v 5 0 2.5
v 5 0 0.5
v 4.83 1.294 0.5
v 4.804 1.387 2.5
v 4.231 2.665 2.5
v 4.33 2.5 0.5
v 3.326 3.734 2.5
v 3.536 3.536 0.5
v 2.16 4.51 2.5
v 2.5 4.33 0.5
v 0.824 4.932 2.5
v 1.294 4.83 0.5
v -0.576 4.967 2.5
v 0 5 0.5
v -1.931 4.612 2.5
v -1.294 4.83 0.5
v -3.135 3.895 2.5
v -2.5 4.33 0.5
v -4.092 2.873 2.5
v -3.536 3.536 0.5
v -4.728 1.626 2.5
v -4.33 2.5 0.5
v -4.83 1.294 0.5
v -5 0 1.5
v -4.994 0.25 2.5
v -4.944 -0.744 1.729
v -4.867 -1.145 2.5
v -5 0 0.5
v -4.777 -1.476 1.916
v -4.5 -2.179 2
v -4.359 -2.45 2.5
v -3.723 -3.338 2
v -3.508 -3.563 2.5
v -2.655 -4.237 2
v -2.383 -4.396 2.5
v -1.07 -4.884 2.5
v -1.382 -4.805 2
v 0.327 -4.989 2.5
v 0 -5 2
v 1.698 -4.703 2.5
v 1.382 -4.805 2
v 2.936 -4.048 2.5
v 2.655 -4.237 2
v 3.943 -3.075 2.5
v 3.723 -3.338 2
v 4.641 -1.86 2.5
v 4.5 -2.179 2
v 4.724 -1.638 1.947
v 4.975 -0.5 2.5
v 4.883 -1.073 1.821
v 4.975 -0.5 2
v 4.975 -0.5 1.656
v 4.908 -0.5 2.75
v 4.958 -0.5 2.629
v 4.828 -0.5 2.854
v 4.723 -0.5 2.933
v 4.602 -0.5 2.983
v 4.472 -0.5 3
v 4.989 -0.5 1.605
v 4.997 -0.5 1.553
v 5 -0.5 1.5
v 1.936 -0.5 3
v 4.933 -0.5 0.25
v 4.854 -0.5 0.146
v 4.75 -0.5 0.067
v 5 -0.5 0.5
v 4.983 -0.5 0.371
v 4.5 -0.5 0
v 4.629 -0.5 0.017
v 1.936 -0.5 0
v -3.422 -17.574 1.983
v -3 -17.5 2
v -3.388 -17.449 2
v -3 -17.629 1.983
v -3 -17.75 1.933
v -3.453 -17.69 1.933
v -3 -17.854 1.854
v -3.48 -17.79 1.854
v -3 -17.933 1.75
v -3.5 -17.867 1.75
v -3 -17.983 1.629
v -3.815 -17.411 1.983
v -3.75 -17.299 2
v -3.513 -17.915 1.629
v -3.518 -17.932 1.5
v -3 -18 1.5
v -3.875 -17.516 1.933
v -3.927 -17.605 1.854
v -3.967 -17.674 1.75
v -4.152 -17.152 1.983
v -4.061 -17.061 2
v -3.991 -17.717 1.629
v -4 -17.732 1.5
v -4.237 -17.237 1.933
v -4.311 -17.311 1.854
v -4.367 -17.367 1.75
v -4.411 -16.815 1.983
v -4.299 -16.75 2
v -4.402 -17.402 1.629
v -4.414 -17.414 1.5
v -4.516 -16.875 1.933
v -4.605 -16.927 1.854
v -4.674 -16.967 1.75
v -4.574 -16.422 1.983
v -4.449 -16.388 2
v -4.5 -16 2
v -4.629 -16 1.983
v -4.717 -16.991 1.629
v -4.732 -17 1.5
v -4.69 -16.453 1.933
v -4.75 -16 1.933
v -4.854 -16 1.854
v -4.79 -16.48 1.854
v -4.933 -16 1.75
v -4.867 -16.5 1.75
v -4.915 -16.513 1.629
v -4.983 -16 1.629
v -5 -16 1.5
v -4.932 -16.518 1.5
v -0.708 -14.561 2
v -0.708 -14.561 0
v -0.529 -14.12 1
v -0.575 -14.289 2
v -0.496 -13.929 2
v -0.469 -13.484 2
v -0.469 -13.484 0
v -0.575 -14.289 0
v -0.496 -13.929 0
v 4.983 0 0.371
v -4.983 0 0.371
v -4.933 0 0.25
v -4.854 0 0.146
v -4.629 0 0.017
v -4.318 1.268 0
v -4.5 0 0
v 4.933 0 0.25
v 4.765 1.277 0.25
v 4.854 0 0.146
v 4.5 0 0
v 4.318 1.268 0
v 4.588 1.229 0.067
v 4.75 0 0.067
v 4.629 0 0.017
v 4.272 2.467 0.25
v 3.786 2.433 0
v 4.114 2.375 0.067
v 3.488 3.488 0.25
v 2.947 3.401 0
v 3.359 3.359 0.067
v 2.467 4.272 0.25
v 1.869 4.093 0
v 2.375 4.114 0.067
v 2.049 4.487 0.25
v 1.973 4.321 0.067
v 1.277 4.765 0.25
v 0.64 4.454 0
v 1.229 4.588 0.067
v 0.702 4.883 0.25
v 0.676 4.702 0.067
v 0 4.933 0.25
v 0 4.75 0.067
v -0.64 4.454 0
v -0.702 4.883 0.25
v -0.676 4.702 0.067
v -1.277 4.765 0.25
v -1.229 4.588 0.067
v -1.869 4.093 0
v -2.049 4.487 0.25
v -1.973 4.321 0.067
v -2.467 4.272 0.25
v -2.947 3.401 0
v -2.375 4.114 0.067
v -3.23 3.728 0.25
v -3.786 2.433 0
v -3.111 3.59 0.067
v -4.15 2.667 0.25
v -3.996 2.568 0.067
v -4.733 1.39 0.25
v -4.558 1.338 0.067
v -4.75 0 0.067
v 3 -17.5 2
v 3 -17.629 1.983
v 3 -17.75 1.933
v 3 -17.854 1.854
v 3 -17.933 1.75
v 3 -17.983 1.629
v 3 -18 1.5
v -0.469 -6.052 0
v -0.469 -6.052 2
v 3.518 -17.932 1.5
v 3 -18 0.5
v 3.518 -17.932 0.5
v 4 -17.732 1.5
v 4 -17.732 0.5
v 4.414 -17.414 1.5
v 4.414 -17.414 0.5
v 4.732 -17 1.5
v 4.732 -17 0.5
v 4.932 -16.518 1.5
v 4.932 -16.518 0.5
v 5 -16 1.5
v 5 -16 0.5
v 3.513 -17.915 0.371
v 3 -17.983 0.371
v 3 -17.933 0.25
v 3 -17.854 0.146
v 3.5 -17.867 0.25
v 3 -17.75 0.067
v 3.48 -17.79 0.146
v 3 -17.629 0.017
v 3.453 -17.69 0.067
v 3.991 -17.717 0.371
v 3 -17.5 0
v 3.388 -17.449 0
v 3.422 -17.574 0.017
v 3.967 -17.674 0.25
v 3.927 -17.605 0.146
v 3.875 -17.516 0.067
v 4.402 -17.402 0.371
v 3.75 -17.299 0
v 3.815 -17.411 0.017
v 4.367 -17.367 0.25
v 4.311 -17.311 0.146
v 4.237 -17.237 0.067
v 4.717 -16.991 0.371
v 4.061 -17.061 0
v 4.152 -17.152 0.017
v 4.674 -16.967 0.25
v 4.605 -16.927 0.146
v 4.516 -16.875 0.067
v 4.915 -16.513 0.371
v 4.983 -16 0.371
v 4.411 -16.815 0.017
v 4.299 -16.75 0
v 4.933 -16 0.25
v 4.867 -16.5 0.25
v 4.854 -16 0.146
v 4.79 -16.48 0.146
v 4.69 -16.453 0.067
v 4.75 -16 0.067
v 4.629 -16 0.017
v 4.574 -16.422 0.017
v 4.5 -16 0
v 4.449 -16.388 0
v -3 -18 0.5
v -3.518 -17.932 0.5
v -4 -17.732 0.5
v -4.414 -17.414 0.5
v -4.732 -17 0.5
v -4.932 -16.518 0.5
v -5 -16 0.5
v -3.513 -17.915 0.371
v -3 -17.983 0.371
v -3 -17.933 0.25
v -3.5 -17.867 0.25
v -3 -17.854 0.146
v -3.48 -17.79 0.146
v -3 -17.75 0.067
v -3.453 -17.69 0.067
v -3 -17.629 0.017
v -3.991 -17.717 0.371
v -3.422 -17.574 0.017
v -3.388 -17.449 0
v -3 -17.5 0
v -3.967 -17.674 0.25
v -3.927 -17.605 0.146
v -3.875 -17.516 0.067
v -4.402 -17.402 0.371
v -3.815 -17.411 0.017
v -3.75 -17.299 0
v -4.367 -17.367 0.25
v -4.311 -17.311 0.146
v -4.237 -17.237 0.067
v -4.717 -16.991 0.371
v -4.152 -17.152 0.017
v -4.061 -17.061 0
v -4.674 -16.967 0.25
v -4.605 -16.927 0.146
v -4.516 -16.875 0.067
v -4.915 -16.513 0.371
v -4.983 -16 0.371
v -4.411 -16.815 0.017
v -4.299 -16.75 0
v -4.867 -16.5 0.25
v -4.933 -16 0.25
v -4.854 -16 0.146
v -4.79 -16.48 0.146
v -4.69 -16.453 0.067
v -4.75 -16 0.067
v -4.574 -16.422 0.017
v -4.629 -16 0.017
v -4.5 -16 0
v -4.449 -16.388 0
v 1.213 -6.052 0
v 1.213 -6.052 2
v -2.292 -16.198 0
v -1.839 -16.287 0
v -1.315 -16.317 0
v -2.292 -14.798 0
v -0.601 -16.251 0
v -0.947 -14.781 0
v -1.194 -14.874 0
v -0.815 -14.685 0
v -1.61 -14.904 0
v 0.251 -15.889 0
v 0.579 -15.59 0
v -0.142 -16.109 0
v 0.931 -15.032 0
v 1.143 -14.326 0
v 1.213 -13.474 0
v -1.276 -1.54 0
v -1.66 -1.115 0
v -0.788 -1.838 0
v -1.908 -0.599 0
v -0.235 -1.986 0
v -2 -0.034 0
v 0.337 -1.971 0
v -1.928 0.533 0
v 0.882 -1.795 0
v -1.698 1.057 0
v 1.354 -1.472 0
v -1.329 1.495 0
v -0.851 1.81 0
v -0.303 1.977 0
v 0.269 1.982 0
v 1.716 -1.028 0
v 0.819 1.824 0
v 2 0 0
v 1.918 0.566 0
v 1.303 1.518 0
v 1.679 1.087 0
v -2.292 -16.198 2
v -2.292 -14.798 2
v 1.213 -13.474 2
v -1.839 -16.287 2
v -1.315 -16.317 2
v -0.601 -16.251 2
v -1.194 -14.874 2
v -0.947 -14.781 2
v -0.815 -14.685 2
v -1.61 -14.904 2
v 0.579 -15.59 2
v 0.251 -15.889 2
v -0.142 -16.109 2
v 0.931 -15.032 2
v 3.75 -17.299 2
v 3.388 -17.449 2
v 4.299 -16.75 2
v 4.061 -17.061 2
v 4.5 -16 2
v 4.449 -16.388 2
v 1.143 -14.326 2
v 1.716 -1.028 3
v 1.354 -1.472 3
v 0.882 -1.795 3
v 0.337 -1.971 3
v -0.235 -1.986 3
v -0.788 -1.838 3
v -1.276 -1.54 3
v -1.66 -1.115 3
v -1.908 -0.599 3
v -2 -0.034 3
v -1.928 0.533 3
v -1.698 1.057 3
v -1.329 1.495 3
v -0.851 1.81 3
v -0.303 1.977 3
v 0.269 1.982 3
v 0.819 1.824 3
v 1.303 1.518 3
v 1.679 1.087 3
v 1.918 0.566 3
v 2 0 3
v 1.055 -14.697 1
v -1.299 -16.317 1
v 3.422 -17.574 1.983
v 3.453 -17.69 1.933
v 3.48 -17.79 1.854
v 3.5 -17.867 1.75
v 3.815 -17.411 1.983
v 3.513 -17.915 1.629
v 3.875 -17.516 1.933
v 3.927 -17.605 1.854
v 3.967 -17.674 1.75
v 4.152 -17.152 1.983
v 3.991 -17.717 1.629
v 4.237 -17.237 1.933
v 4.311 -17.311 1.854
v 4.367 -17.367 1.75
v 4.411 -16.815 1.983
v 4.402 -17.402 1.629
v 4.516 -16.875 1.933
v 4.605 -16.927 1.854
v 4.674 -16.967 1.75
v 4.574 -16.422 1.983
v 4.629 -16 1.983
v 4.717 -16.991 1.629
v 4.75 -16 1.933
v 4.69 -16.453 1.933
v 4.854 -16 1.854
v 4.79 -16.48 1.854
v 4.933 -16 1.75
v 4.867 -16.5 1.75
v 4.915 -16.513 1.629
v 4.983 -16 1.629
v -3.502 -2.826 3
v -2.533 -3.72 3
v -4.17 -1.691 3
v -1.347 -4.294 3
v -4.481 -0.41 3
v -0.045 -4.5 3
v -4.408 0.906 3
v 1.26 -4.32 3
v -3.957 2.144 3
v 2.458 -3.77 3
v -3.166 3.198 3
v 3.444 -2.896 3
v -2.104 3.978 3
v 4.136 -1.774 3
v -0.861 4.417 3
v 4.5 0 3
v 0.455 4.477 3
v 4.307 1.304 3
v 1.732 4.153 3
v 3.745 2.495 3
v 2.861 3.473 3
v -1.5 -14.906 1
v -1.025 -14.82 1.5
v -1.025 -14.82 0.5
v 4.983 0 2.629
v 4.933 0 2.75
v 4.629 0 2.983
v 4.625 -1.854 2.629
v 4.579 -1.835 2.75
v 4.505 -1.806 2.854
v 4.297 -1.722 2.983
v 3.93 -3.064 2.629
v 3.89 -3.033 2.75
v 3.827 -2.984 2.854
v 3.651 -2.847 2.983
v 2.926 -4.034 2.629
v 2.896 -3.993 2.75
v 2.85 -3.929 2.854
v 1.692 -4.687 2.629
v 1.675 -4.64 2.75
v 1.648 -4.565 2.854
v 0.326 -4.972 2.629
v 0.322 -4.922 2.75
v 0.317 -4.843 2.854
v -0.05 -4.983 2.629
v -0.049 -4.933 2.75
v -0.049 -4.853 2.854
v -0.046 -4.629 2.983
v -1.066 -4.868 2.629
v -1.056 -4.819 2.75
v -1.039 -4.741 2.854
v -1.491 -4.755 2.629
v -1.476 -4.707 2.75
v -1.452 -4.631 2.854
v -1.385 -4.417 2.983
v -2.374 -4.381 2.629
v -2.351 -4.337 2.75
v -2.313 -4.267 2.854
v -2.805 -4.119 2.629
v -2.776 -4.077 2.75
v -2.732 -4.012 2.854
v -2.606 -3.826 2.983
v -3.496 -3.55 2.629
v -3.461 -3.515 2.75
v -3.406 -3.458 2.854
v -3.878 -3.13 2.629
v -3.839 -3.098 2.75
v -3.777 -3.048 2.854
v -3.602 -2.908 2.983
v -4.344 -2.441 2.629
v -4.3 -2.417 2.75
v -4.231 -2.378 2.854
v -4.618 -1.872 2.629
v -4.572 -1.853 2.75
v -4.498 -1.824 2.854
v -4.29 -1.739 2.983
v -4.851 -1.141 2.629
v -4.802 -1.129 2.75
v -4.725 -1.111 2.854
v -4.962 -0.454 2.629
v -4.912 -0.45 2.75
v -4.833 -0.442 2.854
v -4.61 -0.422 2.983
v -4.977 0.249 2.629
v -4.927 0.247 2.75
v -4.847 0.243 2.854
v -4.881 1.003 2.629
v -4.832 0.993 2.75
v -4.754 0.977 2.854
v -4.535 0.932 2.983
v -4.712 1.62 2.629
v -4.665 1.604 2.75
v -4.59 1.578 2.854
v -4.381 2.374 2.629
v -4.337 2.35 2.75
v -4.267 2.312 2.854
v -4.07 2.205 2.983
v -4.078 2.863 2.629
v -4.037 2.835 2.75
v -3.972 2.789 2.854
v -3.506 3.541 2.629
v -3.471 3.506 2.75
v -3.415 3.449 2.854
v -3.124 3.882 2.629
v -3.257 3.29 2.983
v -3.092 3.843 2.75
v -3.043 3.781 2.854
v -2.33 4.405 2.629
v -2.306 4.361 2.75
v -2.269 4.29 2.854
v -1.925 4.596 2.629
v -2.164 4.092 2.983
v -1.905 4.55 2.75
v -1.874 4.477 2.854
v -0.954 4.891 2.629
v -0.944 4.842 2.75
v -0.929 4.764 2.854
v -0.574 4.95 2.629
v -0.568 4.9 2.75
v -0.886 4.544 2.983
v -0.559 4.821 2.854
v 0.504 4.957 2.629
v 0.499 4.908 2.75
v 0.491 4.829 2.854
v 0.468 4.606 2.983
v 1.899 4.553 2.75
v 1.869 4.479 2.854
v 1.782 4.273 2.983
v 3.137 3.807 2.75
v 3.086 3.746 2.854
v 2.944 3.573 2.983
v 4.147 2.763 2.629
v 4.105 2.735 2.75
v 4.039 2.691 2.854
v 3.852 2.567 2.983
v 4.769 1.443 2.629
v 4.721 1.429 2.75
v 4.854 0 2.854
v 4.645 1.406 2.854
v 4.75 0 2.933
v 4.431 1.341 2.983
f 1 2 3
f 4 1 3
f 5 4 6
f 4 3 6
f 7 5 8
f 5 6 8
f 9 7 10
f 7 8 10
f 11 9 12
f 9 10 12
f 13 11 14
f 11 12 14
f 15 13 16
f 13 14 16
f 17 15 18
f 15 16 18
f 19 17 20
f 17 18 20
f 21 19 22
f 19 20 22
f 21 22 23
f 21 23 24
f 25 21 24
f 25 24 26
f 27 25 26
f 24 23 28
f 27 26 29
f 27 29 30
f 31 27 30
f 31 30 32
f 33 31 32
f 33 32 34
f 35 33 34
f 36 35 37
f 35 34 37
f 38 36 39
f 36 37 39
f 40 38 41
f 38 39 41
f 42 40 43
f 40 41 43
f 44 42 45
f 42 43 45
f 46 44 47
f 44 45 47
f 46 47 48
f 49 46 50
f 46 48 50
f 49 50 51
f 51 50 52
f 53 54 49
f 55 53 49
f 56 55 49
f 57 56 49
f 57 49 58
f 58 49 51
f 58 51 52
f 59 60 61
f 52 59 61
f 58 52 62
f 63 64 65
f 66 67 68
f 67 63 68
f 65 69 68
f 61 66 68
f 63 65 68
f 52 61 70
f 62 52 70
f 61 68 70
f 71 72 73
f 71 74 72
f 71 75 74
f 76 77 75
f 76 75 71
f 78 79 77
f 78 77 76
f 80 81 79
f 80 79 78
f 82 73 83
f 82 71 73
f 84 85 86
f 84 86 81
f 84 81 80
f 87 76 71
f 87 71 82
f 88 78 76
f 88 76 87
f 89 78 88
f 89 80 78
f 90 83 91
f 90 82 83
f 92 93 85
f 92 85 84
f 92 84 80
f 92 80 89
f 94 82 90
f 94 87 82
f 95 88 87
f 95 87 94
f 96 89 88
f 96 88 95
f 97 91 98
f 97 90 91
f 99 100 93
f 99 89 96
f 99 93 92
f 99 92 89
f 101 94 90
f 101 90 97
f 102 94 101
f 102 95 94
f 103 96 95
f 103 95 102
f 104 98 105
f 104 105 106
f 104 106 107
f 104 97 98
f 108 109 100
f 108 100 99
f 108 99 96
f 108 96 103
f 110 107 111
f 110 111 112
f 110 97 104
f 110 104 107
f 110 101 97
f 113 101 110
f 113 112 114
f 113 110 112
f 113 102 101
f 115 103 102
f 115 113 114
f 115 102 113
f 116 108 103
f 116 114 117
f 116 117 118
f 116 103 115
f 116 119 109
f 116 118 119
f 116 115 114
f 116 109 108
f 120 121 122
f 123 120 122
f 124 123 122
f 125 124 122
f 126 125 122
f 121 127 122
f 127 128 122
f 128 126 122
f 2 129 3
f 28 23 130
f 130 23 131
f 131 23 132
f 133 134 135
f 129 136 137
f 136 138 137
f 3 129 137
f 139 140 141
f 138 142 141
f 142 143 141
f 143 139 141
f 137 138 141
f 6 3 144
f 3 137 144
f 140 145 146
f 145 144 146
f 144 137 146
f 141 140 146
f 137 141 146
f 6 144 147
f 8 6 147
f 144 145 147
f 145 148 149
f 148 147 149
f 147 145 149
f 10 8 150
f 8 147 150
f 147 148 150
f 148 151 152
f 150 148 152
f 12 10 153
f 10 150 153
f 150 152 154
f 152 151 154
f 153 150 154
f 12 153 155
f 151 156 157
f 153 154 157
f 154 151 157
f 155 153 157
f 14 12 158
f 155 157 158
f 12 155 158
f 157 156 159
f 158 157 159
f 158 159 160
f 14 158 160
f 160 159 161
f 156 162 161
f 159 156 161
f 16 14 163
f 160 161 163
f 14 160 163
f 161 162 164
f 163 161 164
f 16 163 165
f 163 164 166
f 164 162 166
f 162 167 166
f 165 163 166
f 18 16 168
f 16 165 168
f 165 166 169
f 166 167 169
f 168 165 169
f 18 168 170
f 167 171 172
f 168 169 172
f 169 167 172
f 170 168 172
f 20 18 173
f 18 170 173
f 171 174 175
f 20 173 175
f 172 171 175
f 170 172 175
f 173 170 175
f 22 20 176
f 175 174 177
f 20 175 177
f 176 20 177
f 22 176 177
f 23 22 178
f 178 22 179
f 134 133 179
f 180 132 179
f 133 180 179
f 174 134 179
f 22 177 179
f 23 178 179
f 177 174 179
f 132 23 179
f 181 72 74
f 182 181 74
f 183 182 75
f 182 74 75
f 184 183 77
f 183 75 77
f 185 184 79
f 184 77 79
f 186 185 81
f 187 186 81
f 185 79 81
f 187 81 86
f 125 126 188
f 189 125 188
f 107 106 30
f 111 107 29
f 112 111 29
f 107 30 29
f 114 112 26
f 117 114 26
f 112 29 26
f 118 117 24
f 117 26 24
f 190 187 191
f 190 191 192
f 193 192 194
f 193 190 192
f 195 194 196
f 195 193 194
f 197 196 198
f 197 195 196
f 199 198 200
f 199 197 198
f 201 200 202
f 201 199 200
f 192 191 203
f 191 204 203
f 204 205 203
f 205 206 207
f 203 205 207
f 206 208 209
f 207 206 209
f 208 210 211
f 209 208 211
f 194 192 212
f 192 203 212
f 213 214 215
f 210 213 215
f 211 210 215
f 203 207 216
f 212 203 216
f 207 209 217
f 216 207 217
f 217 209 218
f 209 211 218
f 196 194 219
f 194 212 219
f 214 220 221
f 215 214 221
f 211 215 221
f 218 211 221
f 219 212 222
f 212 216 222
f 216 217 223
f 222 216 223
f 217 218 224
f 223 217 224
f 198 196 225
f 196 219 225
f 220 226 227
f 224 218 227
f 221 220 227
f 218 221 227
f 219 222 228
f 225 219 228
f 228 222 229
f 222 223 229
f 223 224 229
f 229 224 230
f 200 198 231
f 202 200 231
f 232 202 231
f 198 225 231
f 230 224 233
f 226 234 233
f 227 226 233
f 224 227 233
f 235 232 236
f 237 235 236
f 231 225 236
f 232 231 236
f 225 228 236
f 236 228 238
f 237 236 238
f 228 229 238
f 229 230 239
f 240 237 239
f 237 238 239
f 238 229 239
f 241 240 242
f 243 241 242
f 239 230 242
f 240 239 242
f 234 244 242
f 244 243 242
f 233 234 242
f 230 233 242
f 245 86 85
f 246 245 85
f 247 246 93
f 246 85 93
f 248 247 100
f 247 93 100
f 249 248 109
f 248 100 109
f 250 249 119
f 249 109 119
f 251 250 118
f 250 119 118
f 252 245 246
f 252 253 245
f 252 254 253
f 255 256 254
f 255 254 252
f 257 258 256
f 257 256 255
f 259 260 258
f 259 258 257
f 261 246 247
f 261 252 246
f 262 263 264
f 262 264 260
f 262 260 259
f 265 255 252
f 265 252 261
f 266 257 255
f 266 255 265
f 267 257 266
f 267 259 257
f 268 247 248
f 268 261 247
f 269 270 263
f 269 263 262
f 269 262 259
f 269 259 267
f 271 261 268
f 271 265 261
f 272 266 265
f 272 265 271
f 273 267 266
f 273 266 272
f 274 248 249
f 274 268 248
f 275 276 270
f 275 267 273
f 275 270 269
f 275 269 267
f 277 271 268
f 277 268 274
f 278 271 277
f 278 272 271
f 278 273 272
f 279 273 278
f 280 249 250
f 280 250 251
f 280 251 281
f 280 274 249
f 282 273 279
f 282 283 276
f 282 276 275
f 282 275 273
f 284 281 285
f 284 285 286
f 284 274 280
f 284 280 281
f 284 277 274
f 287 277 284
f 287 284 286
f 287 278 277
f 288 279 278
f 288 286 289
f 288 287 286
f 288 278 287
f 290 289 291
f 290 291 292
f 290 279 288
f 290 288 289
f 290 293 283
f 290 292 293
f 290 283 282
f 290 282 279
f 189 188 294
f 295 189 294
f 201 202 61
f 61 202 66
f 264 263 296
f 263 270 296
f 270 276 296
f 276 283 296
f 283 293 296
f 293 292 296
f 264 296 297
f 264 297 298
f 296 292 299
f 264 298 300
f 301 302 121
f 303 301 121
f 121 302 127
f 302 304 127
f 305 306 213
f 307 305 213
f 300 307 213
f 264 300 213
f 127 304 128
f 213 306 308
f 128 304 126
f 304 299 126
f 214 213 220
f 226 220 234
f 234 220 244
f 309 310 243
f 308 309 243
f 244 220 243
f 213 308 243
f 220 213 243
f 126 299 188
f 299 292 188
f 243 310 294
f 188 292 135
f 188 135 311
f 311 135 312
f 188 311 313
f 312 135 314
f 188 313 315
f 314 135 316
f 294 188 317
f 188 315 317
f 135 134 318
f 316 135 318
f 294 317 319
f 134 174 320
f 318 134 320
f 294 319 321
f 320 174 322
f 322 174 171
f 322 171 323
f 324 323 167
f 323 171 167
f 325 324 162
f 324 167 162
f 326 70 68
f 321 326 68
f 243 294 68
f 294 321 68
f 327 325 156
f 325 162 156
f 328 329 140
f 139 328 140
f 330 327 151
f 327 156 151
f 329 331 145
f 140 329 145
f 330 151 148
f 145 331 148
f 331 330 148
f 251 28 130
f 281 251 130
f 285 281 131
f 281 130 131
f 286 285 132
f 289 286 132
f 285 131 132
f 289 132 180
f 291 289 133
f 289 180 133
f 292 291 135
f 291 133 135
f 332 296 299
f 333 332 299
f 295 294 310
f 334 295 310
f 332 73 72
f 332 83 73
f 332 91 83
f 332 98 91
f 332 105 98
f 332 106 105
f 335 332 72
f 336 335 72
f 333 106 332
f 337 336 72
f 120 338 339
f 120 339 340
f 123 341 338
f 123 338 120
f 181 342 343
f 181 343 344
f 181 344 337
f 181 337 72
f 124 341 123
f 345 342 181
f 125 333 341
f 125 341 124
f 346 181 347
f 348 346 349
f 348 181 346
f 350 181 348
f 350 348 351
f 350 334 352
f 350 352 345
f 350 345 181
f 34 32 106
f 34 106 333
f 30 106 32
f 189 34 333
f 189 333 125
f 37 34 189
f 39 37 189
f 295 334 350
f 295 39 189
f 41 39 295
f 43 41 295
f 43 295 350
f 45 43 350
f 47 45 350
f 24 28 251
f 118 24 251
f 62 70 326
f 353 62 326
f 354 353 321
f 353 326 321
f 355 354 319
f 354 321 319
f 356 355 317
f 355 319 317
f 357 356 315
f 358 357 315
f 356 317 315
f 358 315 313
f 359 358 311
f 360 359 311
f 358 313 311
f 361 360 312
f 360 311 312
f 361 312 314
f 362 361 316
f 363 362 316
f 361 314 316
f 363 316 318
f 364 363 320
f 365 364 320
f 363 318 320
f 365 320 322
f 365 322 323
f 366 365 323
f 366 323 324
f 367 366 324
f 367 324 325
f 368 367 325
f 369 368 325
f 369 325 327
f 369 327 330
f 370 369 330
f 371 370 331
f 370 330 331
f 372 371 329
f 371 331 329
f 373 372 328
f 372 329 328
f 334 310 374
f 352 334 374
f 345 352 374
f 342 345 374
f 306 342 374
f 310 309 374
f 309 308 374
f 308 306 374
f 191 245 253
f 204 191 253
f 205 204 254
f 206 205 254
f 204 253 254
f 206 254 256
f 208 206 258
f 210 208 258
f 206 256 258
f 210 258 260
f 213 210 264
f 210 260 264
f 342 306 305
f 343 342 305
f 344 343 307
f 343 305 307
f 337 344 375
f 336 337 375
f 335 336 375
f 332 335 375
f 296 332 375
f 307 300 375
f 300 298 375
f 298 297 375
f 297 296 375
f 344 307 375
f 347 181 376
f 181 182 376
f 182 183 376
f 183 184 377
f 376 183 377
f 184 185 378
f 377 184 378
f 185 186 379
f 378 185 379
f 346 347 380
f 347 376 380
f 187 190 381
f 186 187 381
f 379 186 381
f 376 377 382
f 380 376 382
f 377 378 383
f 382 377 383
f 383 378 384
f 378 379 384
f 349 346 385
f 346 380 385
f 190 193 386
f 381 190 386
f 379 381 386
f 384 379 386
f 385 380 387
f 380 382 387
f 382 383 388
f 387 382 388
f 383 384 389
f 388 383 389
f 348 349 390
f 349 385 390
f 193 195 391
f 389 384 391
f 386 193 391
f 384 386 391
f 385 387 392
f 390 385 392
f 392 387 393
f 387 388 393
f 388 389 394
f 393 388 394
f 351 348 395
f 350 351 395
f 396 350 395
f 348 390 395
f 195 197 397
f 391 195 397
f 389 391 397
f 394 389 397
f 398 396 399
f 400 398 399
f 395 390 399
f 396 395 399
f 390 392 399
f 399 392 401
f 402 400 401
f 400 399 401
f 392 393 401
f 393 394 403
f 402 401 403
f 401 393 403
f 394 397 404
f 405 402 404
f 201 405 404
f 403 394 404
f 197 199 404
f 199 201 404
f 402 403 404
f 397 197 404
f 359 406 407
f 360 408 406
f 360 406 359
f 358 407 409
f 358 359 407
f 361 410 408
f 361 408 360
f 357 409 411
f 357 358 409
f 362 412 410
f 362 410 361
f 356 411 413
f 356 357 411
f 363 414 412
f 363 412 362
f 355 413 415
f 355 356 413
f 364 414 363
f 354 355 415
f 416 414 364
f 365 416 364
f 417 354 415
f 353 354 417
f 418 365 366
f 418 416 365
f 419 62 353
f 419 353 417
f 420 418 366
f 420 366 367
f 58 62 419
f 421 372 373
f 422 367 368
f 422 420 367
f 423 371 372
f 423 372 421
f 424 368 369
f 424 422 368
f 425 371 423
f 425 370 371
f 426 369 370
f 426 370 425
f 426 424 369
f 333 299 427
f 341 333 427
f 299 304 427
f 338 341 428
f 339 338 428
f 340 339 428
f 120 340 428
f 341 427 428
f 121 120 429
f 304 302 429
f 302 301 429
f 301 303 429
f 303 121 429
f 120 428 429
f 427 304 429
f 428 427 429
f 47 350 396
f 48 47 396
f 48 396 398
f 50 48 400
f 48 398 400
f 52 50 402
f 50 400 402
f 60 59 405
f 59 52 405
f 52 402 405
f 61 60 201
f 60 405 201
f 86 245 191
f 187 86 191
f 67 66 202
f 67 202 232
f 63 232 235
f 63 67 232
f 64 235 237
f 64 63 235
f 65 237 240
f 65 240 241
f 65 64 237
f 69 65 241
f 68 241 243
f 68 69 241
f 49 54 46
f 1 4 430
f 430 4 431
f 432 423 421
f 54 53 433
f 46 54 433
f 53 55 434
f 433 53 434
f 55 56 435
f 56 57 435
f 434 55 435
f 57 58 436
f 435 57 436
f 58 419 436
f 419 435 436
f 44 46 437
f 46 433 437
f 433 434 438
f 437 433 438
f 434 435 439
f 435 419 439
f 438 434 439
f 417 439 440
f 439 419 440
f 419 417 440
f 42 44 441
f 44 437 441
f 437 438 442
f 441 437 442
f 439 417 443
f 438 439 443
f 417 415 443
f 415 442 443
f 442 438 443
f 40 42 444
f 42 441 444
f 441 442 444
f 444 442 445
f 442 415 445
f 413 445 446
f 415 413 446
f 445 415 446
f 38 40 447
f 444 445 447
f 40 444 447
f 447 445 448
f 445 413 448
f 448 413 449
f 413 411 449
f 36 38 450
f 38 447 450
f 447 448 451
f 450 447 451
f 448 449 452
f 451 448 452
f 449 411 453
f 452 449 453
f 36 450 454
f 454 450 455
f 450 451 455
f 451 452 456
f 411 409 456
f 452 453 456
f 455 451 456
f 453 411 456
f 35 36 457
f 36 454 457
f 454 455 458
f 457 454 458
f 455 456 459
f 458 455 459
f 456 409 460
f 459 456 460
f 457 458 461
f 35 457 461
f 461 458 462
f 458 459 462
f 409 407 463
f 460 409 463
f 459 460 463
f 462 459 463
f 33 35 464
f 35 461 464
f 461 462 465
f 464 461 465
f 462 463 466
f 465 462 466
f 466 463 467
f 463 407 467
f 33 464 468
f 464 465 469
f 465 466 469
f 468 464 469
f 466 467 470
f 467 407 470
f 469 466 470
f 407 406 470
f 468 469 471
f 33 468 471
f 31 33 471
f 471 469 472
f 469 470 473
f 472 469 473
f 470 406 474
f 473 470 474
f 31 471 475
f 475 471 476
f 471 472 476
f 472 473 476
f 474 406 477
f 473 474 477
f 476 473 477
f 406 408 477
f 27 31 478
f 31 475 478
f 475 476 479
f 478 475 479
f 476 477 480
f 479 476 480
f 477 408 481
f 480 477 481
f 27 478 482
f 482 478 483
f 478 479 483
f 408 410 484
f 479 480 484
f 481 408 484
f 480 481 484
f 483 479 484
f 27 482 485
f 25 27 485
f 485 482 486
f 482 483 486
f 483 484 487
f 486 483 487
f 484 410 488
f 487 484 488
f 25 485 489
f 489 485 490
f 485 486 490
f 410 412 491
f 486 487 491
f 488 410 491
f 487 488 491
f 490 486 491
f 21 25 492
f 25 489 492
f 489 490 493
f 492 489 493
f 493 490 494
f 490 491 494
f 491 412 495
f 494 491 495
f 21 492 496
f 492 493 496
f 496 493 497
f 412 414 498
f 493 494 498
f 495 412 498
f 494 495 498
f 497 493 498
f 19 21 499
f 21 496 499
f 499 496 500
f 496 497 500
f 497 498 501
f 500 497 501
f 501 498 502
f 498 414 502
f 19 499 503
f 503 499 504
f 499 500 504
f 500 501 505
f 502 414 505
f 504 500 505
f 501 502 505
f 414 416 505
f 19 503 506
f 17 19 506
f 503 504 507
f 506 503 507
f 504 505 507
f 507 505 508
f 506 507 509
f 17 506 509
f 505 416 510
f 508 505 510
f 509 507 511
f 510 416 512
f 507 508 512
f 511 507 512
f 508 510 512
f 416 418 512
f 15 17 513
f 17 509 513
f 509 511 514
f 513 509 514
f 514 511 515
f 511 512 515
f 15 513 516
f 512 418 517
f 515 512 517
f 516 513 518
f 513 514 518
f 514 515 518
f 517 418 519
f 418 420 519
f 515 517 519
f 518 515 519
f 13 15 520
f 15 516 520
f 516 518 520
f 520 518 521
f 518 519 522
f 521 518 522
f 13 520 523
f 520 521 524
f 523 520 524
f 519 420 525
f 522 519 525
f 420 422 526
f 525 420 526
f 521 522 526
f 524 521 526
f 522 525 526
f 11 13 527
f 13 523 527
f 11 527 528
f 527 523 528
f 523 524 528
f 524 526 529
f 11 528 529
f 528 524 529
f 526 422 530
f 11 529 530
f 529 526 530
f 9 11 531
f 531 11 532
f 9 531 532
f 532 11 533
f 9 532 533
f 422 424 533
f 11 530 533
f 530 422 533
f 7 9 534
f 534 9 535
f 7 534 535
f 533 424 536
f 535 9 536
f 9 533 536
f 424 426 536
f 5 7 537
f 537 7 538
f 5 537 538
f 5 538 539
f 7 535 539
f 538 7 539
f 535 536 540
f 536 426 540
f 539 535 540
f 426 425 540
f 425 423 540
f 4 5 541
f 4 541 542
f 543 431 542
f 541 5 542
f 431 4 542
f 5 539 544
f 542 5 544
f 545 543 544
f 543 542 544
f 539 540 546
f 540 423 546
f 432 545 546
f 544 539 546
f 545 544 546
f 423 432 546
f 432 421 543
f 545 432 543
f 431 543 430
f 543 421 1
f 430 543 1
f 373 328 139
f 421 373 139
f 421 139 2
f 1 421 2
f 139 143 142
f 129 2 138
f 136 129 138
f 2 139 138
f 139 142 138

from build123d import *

# Parameters (mm, degrees)
F1_DEPTH     = 3
F2_DEPTH     = 2
F3_R         = 2
F4_T1_DEPTH  = 16.75
F4_T3_DEPTH  = 6
F4_T5_DEPTH  = 16
F4_T10_DEPTH = 16.75
F4_S11_R     = 5
F4_T12_DEPTH = 10
F4_T14_ANGLE = 359.64
F4_T18_DEPTH = 19.75
F4_S19_R     = 5
F4_T20_DEPTH = 11
F4_T22_ANGLE = 90
F4_T24_ANGLE = 90
F4_T26_ANGLE = 90
F4_T28_ANGLE = 180
F4_T30_ANGLE = 90


# Not quite as in the source:
# - a fillet or chamfer that OpenCascade refuses, or shapes differently, is made with other operations: its cross-section is extruded or revolved along the edge and cut away or added


with BuildPart() as f1:
    # F0 (on Top) → F1 (new body)
    with BuildSketch(Plane.XY):
        with BuildLine():
            Line((2, 0), (5, 0))
            ThreePointArc((5, 0), (0, 5), (-5, 0))
            ThreePointArc((-5, 0), (-0.2503138753, -4.9937303656), (4.9749371855, -0.5))
            Line((4.9749371855, -0.5), (1.9364916731, -0.5))
            ThreePointArc((1.9364916731, -0.5), (-1.9840593925, 0.252008585), (2, 0))
        make_face()
    extrude(amount=F1_DEPTH)

    # F0 (on Top) → F2 (join)
    with BuildSketch(Plane.XY):
        with BuildLine():
            ThreePointArc((4.9749371855, -0.5), (-0.2503138753, -4.9937303656), (-5, 0))
            Line((-5, 0), (-5, -18))
            Line((-5, -18), (5, -18))
            Line((5, -18), (5, -0.5))
            Line((5, -0.5), (4.9749371855, -0.5))
        make_face()
        with BuildLine():
            add(Edge.make_bspline(
                [(0.578588878, -15.5900442691), (-0.0559597331, -16.3174748247), (-1.2990152887, -16.3174748247)],
                knots=[0, 0, 0, 1, 1, 1], degree=2))
            add(Edge.make_bspline(
                [(-1.2990152887, -16.3174748247), (-1.8684597331, -16.3174748247), (-2.2920708442, -16.197683158)],
                knots=[0, 0, 0, 1, 1, 1], degree=2))
            Line((-2.2920708442, -16.197683158), (-2.2920708442, -14.7983776025))
            add(Edge.make_bspline(
                [(-2.2920708442, -14.7983776025), (-1.8580430665, -14.9060164914), (-1.5004041776, -14.9060164914)],
                knots=[0, 0, 0, 1, 1, 1], degree=2))
            add(Edge.make_bspline(
                [(-1.5004041776, -14.9060164914), (-0.9465847331, -14.9060164914), (-0.7078694553, -14.5613984358)],
                knots=[0, 0, 0, 1, 1, 1], degree=2))
            add(Edge.make_bspline(
                [(-0.7078694553, -14.5613984358), (-0.4691541776, -14.2167803802), (-0.4691541776, -13.4841414914)],
                knots=[0, 0, 0, 1, 1, 1], degree=2))
            Line((-0.4691541776, -13.4841414914), (-0.4691541776, -6.0518498247))
            Line((-0.4691541776, -6.0518498247), (1.2131374891, -6.0518498247))
            Line((1.2131374891, -6.0518498247), (1.2131374891, -13.4737248247))
            add(Edge.make_bspline(
                [(1.2131374891, -13.4737248247), (1.2131374891, -14.8626137136), (0.578588878, -15.5900442691)],
                knots=[0, 0, 0, 1, 1, 1], degree=2))
        make_face(mode=Mode.SUBTRACT)
    extrude(amount=F2_DEPTH)

    # F3
    f3_edges = [f1.edges().sort_by_distance(p)[0] for p in [
        (-5, -18, 1),
        (5, -18, 1),
    ]]
    fillet(f3_edges, radius=F3_R)

    # F4: fillet of radius 0.5 on 12 edges, made by hand

    # F4_s2 → F4_t1 (cut)
    with BuildSketch(Plane.XZ.offset(-0.75)):
        with BuildLine():
            ThreePointArc((5, 0.5), (4.8535533906, 0.1464466094), (4.5, 0))
            Line((4.5, 0), (5, 0))
            Line((5, 0), (5, 0.5))
        make_face()
    extrude(amount=F4_T1_DEPTH, mode=Mode.SUBTRACT)

    # F4_s4 → F4_t3 (cut)
    with BuildSketch(Plane.YZ.offset(-3)):
        with BuildLine():
            ThreePointArc((-17.5, 2), (-17.8535533906, 1.8535533906), (-18, 1.5))
            Line((-18, 1.5), (-18, 2))
            Line((-18, 2), (-17.5, 2))
        make_face()
        with BuildLine():
            ThreePointArc((-18, 0.5), (-17.8535533906, 0.1464466094), (-17.5, 0))
            Line((-17.5, 0), (-18, 0))
            Line((-18, 0), (-18, 0.5))
        make_face()
    extrude(amount=F4_T3_DEPTH, mode=Mode.SUBTRACT)

    # F4_s6 → F4_t5 (cut)
    with BuildSketch(Plane.XZ):
        with BuildLine():
            ThreePointArc((-5, 0.5), (-4.8535533906, 0.1464466094), (-4.5, 0))
            Line((-4.5, 0), (-5, 0))
            Line((-5, 0), (-5, 0.5))
        make_face()
    extrude(amount=F4_T5_DEPTH, mode=Mode.SUBTRACT)


with BuildPart() as f4_tool8:
    # F4_s9 → F4_t10 (new body)
    with BuildSketch(Plane.XZ.offset(16)):
        with BuildLine():
            ThreePointArc((4.5, 2), (4.8535533906, 1.8535533906), (5, 1.5))
            Line((5, 1.5), (5, 2))
            Line((5, 2), (4.5, 2))
        make_face()
    extrude(amount=-F4_T10_DEPTH)

    # F4_s11 → F4_t12 (cut, symmetric)
    with BuildSketch(Plane.XY.offset(1.8)):
        Circle(F4_S11_R)
    extrude(amount=F4_T12_DEPTH, both=True, mode=Mode.SUBTRACT)


with BuildPart() as f1_1:
    add(f1.part)

    # F4_t7: cut F4_tool8
    add(f4_tool8.part, mode=Mode.SUBTRACT)

    # F4_s13 → F4_t14 (revolve, cut)
    with BuildSketch(Plane(origin=(0, 0, 0), x_dir=(0, 0, 1), z_dir=(0.0532001762, 0.9985838679, 0))):
        with BuildLine():
            ThreePointArc((2.5, 5), (2.8535533906, 4.8535533906), (3, 4.5))
            Line((3, 4.5), (3, 5))
            Line((3, 5), (2.5, 5))
        make_face()
    revolve(axis=Axis((0, 0, 3), (0, 0, -1)), revolution_arc=F4_T14_ANGLE, mode=Mode.SUBTRACT)


with BuildPart() as f4_tool16:
    # F4_s17 → F4_t18 (new body)
    with BuildSketch(Plane.XZ.offset(-3.75)):
        with BuildLine():
            ThreePointArc((-4.5, 2), (-4.8535533906, 1.8535533906), (-5, 1.5))
            Line((-5, 1.5), (-5, 2))
            Line((-5, 2), (-4.5, 2))
        make_face()
    extrude(amount=F4_T18_DEPTH)

    # F4_s19 → F4_t20 (cut, symmetric)
    with BuildSketch(Plane.XY.offset(1.8)):
        Circle(F4_S19_R)
    extrude(amount=F4_T20_DEPTH, both=True, mode=Mode.SUBTRACT)


with BuildPart() as f1_2:
    add(f1_1.part)

    # F4_t15: cut F4_tool16
    add(f4_tool16.part, mode=Mode.SUBTRACT)

    # F4_s21 → F4_t22 (revolve, cut)
    with BuildSketch(Plane.YZ.offset(-3)):
        with BuildLine():
            ThreePointArc((-17.5, 2), (-17.8535533906, 1.8535533906), (-18, 1.5))
            Line((-18, 1.5), (-18, 2))
            Line((-18, 2), (-17.5, 2))
        make_face()
    revolve(axis=Axis((-3, -16, 2), (0, 0, -1)), revolution_arc=F4_T22_ANGLE, mode=Mode.SUBTRACT)

    # F4_s23 → F4_t24 (revolve, cut)
    with BuildSketch(Plane.YZ.offset(3)):
        with BuildLine():
            ThreePointArc((-17.5, 2), (-17.8535533906, 1.8535533906), (-18, 1.5))
            Line((-18, 1.5), (-18, 2))
            Line((-18, 2), (-17.5, 2))
        make_face()
    revolve(axis=Axis((3, -16, 2), (0, 0, 1)), revolution_arc=F4_T24_ANGLE, mode=Mode.SUBTRACT)

    # F4_s25 → F4_t26 (revolve, cut)
    with BuildSketch(Plane.YZ.offset(-3)):
        with BuildLine():
            ThreePointArc((-18, 0.5), (-17.8535533906, 0.1464466094), (-17.5, 0))
            Line((-17.5, 0), (-18, 0))
            Line((-18, 0), (-18, 0.5))
        make_face()
    revolve(axis=Axis((-3, -16, 0), (0, 0, -1)), revolution_arc=F4_T26_ANGLE, mode=Mode.SUBTRACT)

    # F4_s27 → F4_t28 (revolve, cut)
    with BuildSketch(Plane.XZ):
        with BuildLine():
            ThreePointArc((5, 0.5), (4.8535533906, 0.1464466094), (4.5, 0))
            Line((4.5, 0), (5, 0))
            Line((5, 0), (5, 0.5))
        make_face()
    revolve(axis=Axis((0, 0, 0), (0, 0, 1)), revolution_arc=F4_T28_ANGLE, mode=Mode.SUBTRACT)

    # F4_s29 → F4_t30 (revolve, cut)
    with BuildSketch(Plane.YZ.offset(3)):
        with BuildLine():
            ThreePointArc((-18, 0.5), (-17.8535533906, 0.1464466094), (-17.5, 0))
            Line((-17.5, 0), (-18, 0))
            Line((-18, 0), (-18, 0.5))
        make_face()
    revolve(axis=Axis((3, -16, 0), (0, 0, 1)), revolution_arc=F4_T30_ANGLE, mode=Mode.SUBTRACT)


solid = f1_2.part
